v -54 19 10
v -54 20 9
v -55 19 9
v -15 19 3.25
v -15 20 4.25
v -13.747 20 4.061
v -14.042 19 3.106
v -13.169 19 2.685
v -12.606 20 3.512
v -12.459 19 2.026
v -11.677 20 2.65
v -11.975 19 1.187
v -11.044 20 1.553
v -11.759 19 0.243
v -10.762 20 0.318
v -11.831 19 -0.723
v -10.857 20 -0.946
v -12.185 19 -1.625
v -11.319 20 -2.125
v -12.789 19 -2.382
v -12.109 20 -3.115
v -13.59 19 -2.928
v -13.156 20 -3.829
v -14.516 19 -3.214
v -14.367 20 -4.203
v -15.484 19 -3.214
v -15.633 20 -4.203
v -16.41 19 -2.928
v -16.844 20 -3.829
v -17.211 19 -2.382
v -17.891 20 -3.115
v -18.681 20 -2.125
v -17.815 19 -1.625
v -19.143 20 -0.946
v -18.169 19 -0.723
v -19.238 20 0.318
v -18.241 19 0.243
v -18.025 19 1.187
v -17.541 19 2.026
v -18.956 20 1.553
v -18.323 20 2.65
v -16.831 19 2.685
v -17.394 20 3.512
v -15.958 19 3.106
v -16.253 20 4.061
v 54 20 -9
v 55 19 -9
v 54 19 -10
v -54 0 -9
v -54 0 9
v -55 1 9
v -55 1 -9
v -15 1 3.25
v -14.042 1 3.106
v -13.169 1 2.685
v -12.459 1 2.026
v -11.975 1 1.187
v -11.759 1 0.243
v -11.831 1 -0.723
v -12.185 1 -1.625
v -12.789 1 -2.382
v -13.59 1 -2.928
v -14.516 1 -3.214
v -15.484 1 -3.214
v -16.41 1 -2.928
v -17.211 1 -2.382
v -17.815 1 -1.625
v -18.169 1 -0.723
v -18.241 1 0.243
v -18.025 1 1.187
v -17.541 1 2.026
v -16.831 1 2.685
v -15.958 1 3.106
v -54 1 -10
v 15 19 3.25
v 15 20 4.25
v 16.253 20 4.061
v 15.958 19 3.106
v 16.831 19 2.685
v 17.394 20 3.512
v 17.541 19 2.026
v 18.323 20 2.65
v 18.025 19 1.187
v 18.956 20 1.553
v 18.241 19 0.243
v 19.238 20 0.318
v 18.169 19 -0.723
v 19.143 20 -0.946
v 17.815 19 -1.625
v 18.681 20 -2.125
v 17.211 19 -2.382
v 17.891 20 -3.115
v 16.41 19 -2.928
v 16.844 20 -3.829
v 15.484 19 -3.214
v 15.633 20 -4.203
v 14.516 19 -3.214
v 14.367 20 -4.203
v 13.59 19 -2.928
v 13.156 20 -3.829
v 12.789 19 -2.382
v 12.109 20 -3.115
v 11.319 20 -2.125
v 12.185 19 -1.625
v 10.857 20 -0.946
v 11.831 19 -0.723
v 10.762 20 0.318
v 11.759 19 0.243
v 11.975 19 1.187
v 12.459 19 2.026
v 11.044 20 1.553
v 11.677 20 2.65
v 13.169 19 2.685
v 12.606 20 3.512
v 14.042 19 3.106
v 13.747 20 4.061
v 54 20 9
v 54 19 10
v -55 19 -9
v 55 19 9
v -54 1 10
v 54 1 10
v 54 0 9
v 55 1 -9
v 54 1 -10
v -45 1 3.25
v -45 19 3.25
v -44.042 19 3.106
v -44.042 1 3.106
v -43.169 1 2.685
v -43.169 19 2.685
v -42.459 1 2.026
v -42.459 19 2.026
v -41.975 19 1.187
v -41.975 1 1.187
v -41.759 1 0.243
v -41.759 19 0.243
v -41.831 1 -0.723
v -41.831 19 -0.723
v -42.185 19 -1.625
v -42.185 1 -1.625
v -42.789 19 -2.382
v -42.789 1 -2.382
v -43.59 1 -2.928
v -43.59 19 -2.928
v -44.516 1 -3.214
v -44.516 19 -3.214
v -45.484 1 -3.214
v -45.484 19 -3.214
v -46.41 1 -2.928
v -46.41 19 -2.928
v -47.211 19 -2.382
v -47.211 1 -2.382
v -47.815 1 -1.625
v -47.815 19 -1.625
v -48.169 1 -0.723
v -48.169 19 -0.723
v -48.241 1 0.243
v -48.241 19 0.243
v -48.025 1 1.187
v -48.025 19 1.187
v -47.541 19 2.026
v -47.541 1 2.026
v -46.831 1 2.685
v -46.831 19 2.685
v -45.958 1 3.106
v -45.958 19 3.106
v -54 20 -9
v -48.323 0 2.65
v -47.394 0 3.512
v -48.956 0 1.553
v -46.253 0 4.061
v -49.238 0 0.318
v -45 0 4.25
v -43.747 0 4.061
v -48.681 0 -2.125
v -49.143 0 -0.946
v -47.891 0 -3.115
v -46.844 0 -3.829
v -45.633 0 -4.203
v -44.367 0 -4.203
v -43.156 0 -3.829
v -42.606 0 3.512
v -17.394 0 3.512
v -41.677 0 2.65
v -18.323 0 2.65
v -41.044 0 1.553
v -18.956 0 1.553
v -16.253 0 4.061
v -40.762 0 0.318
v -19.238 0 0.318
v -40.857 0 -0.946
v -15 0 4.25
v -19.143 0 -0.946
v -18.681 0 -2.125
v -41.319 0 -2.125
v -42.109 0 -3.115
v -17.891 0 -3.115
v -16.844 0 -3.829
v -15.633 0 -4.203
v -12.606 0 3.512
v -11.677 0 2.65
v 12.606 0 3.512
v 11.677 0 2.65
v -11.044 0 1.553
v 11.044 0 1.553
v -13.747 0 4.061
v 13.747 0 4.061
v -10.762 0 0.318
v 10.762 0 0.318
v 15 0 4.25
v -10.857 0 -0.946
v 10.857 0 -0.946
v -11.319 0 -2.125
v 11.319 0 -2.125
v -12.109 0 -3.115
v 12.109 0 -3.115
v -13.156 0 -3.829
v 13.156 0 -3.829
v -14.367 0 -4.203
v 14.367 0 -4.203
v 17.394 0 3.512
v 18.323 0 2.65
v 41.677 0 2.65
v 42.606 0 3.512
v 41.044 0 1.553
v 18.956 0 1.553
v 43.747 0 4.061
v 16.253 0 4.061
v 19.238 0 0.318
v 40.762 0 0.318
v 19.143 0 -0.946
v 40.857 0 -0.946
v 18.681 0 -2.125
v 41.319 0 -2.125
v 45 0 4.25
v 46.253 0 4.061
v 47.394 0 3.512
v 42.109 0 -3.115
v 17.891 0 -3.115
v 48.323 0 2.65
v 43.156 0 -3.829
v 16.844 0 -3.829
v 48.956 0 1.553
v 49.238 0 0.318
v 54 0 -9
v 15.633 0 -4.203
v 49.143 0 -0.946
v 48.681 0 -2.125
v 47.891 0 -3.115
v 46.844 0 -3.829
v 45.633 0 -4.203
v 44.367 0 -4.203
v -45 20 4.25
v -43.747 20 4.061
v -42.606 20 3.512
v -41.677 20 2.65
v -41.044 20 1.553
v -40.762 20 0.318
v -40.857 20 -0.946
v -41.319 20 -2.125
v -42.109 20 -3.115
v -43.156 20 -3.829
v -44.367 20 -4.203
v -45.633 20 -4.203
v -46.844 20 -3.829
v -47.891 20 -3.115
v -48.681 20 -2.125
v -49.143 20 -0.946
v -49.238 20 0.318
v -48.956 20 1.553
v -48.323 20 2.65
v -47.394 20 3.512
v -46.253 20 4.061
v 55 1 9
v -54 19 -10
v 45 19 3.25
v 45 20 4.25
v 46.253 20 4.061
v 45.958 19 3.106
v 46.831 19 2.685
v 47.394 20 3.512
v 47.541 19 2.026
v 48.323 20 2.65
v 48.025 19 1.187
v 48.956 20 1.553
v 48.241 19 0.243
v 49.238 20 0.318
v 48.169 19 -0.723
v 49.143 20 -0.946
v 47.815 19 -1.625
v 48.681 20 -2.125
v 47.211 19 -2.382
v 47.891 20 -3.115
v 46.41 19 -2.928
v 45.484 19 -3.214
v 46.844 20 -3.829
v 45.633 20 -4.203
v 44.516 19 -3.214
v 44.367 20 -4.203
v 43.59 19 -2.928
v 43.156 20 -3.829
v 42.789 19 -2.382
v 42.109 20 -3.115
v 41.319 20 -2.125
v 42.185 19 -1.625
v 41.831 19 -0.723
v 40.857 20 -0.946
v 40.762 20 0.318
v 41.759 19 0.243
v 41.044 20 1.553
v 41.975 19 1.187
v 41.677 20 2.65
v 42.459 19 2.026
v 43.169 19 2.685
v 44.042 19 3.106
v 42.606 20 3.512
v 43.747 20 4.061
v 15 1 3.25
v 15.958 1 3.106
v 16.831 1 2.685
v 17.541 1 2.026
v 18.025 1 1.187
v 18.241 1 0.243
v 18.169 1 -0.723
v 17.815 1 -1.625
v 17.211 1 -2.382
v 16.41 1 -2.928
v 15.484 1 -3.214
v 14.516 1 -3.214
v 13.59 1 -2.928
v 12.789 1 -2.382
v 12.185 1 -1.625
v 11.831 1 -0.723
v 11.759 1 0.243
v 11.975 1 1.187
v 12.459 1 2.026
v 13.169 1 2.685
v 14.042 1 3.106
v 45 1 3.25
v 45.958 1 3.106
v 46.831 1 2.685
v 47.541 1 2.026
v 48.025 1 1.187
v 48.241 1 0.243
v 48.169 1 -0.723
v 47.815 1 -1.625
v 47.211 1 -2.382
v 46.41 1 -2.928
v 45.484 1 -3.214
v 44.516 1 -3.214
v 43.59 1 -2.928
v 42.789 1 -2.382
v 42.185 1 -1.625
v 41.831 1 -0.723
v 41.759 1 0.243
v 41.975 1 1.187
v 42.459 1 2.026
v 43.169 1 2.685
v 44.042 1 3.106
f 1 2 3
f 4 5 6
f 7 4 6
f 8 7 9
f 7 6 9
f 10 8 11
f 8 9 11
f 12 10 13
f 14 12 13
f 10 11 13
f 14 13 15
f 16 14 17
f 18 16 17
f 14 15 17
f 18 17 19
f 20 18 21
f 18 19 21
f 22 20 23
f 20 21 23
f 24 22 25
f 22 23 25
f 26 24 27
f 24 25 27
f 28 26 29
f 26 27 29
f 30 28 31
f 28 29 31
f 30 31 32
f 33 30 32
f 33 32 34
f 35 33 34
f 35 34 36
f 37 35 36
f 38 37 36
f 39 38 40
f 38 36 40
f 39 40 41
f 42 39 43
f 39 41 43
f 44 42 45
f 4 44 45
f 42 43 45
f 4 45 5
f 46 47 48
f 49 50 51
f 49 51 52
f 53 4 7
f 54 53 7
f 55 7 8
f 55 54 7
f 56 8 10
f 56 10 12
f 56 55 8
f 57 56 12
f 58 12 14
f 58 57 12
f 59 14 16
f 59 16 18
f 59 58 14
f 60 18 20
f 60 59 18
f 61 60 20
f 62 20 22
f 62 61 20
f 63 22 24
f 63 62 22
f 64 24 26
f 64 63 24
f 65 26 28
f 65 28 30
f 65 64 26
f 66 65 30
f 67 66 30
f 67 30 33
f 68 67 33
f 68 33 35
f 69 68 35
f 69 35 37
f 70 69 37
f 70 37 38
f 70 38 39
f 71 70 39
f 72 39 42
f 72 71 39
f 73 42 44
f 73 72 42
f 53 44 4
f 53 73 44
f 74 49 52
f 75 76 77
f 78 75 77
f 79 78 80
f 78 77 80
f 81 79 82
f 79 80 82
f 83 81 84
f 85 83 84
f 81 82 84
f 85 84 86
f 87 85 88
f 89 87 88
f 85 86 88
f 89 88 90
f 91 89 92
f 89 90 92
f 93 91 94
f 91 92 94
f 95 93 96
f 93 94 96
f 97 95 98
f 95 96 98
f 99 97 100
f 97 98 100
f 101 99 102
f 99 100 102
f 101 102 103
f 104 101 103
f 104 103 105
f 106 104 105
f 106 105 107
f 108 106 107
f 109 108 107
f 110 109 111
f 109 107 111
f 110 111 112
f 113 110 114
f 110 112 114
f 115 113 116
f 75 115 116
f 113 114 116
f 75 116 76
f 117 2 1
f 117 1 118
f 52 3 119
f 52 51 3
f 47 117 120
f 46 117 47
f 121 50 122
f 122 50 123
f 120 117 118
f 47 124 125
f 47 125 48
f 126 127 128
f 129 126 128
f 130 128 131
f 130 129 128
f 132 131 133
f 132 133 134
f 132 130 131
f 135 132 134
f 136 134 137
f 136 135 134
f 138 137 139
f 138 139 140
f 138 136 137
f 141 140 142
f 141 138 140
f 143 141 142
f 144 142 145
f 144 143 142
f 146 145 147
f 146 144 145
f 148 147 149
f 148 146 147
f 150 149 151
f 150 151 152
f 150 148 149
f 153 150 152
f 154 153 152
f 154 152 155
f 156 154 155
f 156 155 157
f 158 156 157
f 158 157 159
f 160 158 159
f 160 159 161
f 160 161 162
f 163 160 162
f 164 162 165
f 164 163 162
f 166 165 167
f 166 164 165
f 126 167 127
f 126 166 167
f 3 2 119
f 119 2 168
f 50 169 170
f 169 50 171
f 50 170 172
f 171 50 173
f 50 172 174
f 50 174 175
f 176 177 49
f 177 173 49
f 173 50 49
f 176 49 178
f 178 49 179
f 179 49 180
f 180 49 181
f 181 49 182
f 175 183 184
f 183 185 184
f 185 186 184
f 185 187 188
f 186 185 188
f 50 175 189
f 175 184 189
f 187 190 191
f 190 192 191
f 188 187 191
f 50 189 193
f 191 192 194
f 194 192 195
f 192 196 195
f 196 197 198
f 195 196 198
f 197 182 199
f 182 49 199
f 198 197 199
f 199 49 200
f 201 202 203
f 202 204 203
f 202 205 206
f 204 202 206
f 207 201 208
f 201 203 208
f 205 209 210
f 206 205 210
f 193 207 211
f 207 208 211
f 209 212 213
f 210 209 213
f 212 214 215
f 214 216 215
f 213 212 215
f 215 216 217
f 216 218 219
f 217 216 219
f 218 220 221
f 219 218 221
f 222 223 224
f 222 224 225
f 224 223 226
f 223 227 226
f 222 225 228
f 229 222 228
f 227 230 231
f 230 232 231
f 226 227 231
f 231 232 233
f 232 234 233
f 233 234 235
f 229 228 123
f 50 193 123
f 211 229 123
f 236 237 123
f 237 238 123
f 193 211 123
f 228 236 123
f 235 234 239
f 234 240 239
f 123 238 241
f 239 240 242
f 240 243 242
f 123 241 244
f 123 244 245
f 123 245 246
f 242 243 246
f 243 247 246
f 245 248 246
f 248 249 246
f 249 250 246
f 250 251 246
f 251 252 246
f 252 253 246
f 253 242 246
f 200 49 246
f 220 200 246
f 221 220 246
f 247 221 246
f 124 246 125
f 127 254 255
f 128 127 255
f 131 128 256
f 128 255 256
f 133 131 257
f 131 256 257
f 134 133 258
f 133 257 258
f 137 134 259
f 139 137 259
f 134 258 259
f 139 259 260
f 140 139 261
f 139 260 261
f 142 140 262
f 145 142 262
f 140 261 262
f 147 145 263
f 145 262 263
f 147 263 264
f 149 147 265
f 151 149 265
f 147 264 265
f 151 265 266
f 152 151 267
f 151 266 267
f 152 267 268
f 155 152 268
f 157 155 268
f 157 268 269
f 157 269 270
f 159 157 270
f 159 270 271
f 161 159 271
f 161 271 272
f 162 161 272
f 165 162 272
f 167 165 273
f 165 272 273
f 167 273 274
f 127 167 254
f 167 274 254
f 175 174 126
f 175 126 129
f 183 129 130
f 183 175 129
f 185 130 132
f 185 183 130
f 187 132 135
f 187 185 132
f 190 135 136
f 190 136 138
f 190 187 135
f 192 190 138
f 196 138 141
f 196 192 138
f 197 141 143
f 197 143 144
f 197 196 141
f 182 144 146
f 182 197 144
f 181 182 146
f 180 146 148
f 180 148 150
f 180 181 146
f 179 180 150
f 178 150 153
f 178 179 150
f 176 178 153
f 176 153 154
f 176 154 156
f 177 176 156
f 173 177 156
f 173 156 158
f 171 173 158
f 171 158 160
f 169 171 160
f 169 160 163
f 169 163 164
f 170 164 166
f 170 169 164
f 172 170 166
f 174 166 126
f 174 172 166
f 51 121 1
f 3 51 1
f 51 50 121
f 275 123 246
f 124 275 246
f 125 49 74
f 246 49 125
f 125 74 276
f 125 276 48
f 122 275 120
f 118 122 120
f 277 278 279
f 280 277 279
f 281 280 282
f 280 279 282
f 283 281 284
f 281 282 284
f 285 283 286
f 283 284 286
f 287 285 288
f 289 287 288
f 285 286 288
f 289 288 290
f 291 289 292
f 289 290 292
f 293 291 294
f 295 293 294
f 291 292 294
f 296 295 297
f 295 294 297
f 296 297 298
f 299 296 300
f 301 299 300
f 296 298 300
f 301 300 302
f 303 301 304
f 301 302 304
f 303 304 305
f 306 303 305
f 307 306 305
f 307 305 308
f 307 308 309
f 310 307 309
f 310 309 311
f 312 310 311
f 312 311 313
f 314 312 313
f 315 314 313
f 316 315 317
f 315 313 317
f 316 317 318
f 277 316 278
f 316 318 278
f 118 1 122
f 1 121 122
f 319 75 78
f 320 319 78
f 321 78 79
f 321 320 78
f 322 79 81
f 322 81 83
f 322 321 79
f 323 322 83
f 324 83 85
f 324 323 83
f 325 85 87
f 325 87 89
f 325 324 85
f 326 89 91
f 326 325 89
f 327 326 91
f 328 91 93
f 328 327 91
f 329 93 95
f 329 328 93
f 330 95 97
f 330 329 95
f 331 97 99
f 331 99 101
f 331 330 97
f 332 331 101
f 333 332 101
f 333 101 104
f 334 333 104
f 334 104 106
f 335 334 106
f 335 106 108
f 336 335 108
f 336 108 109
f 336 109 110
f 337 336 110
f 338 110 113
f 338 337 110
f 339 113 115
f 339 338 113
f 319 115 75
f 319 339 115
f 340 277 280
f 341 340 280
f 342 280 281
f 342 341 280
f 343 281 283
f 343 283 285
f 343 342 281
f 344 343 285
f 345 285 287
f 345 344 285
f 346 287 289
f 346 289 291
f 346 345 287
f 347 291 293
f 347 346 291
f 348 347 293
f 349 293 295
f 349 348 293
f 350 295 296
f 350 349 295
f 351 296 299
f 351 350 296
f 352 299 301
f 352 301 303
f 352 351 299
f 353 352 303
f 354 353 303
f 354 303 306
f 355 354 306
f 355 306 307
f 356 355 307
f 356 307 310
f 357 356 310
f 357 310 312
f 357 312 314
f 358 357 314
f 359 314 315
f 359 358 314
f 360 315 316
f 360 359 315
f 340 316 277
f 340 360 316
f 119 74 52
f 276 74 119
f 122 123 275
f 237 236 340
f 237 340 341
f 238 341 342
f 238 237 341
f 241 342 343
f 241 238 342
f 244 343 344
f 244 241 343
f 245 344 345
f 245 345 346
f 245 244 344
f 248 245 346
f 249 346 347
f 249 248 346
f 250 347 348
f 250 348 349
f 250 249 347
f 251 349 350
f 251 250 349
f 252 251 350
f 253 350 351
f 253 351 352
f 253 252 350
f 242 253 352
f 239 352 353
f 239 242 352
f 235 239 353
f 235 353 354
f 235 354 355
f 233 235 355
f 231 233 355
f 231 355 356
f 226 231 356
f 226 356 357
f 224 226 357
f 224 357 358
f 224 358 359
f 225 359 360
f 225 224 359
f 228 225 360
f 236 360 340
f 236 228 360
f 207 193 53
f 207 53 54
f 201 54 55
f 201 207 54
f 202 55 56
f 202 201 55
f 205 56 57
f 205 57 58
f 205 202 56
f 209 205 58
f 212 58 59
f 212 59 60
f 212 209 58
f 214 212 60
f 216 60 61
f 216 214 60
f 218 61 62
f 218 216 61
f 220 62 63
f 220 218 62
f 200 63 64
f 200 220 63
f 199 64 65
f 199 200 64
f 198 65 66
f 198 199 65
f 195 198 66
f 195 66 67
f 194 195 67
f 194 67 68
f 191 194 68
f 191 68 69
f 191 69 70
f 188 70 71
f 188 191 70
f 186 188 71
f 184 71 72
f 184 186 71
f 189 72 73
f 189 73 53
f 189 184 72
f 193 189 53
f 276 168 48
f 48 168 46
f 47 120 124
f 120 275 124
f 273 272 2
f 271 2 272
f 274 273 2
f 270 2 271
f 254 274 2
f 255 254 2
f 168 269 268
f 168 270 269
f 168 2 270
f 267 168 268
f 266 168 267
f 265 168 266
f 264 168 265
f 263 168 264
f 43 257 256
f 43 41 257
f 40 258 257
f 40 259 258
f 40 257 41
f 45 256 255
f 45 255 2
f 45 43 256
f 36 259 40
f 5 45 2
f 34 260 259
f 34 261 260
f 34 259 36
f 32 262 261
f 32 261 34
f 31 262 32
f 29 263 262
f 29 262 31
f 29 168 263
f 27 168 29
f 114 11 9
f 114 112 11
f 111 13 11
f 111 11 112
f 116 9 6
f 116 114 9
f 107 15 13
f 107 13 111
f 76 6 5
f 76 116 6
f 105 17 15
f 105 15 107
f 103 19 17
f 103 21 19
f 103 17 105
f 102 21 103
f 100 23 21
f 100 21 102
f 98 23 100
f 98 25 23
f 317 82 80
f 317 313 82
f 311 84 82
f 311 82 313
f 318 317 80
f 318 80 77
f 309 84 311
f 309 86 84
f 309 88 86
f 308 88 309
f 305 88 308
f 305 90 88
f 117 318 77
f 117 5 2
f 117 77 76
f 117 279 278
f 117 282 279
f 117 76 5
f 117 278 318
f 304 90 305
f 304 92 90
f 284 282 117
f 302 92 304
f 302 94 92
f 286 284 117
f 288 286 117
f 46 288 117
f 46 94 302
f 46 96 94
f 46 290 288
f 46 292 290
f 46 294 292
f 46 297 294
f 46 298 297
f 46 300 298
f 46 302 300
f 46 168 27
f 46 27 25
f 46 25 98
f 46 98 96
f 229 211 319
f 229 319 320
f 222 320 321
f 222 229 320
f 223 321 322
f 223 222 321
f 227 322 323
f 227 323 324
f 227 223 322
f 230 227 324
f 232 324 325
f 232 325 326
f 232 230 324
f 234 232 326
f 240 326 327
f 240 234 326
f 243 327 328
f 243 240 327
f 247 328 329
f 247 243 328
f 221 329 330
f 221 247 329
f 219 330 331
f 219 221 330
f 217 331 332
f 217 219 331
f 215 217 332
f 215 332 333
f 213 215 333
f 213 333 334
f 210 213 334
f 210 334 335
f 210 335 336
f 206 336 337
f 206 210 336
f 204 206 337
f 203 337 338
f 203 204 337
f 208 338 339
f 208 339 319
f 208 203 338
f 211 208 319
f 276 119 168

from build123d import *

# Parameters (mm, degrees)
SKETCH1_W           = 110
SKETCH1_H           = 20
SKETCH1_R           = 3.25
BOSS_EXTRUDE1_DEPTH = 20
CHAMFER1_SIZE       = 1


with BuildPart() as part:
    # Sketch1 → Boss-Extrude1 (new body)
    with BuildSketch(Plane(origin=(0, 0, 0), x_dir=(1, 0, 0), z_dir=(0, 1, 0))):
        Rectangle(SKETCH1_W, SKETCH1_H)
        with Locations(Location((-45, 0, 0), (0, 0, 270))):
            Circle(SKETCH1_R, mode=Mode.SUBTRACT)
        with Locations(Location((-15, 0, 0), (0, 0, 270))):
            Circle(SKETCH1_R, mode=Mode.SUBTRACT)
        with Locations(Location((15, 0, 0), (0, 0, 270))):
            Circle(SKETCH1_R, mode=Mode.SUBTRACT)
        with Locations(Location((45, 0, 0), (0, 0, 270))):
            Circle(SKETCH1_R, mode=Mode.SUBTRACT)
    extrude(amount=BOSS_EXTRUDE1_DEPTH)

    # Chamfer1
    chamfer1_edges = [part.edges().sort_by_distance(p)[0] for p in [
        (-45, 0, -3.25),
        (-45, 20, -3.25),
        (-55, 20, 0),
        (-15, 0, -3.25),
        (-15, 20, -3.25),
        (0, 20, 10),
        (15, 0, -3.25),
        (15, 20, -3.25),
        (45, 0, -3.25),
        (45, 20, -3.25),
        (55, 20, 0),
        (0, 0, 10),
        (-55, 0, 0),
        (0, 0, -10),
        (55, 0, 0),
        (55, 10, 10),
        (-55, 10, 10),
        (-55, 10, -10),
        (55, 10, -10),
        (0, 20, -10),
    ]]
    chamfer(chamfer1_edges, length=CHAMFER1_SIZE)


solid = part.part
